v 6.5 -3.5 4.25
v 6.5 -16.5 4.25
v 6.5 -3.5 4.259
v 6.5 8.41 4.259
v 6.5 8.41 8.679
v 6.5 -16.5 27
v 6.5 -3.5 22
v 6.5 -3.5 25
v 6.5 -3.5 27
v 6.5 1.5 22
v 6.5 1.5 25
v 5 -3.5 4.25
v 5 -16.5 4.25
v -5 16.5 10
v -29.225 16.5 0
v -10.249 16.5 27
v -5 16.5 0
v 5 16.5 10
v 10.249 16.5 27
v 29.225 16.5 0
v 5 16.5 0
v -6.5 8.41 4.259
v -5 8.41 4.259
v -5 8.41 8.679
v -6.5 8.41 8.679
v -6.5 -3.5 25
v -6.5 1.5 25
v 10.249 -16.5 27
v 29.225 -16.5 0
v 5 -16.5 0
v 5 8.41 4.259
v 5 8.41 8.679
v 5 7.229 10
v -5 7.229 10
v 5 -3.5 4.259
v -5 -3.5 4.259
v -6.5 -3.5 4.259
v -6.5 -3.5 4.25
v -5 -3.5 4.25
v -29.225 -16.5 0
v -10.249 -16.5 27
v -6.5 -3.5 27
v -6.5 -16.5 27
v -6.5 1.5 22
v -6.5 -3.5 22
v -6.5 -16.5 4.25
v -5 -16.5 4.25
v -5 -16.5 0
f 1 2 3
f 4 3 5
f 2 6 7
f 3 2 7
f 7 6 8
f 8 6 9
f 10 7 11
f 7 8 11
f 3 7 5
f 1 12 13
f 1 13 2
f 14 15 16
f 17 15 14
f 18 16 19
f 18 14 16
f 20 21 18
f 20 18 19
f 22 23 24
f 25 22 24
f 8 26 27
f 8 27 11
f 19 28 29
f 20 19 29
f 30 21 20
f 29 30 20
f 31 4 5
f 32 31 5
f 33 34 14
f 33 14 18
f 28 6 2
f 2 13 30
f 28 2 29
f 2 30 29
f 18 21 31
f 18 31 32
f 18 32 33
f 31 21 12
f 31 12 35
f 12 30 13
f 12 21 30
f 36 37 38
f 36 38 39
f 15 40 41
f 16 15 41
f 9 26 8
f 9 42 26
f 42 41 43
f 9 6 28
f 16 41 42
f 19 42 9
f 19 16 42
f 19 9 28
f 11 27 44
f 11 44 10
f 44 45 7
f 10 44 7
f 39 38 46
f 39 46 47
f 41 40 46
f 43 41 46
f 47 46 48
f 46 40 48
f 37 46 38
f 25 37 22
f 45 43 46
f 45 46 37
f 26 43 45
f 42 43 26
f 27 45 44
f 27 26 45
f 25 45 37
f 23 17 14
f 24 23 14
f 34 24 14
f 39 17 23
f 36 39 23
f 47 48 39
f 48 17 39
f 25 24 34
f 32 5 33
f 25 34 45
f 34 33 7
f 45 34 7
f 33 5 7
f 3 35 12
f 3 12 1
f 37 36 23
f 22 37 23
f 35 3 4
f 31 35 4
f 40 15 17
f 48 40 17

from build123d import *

# Parameters (mm, degrees)
F0_W      = 58.45
F0_H      = 33
F1_DEPTH  = 27
F3_DEPTH  = 33
F4_W      = 10
F4_H      = 13
F5_DEPTH  = 27
F6_W      = 13
F6_H      = 13
F7_DEPTH  = 22.75
F8_W      = 13
F8_H      = 3
F9_DEPTH  = 5
F10_W     = 10
F10_H     = 10
F11_DEPTH = 33
F13_DEPTH = 6.5


with BuildPart() as f1:
    # F0 (on Top) → F1 (new body)
    with BuildSketch(Plane.XY):
        Rectangle(F0_W, F0_H)
    extrude(amount=F1_DEPTH)

    # F2 (on face) → F3 (cut)
    with BuildSketch(Plane.XZ.offset(16.5)):
        Polygon((-29.225, 27), (-29.225, 0), (-10.249082, 27), align=None)
        Polygon((29.225, 27), (10.249082, 27), (29.225, 0), align=None)
    extrude(amount=-F3_DEPTH, mode=Mode.SUBTRACT)

    # F4 (on face) → F5 (cut)
    with BuildSketch(Plane.XY.offset(27)):
        with Locations((0, -10)):
            Rectangle(F4_W, F4_H)
    extrude(amount=-F5_DEPTH, mode=Mode.SUBTRACT)

    # F6 (on face) → F7 (cut)
    with BuildSketch(Plane.XY.offset(27)):
        with Locations((0, -10)):
            Rectangle(F6_W, F6_H)
    extrude(amount=-F7_DEPTH, mode=Mode.SUBTRACT)

    # F8 (on face) → F9 (cut)
    with BuildSketch(Plane.XZ.offset(3.5)):
        with Locations((0, 23.5)):
            Rectangle(F8_W, F8_H)
    extrude(amount=-F9_DEPTH, mode=Mode.SUBTRACT)

    # F10 (on face) → F11 (cut)
    with BuildSketch(Plane.XZ.offset(3.5)):
        with Locations((0, 5)):
            Rectangle(F10_W, F10_H)
    extrude(amount=-F11_DEPTH, mode=Mode.SUBTRACT)

    # F12 (on Right) → F13 (cut, symmetric)
    with BuildSketch(Plane.YZ):
        Polygon((-3.5, 22), (-3.5, 4.25939), (8.41, 4.25939), (8.41, 8.67939), align=None)
    extrude(amount=F13_DEPTH, both=True, mode=Mode.SUBTRACT)


solid = f1.part
